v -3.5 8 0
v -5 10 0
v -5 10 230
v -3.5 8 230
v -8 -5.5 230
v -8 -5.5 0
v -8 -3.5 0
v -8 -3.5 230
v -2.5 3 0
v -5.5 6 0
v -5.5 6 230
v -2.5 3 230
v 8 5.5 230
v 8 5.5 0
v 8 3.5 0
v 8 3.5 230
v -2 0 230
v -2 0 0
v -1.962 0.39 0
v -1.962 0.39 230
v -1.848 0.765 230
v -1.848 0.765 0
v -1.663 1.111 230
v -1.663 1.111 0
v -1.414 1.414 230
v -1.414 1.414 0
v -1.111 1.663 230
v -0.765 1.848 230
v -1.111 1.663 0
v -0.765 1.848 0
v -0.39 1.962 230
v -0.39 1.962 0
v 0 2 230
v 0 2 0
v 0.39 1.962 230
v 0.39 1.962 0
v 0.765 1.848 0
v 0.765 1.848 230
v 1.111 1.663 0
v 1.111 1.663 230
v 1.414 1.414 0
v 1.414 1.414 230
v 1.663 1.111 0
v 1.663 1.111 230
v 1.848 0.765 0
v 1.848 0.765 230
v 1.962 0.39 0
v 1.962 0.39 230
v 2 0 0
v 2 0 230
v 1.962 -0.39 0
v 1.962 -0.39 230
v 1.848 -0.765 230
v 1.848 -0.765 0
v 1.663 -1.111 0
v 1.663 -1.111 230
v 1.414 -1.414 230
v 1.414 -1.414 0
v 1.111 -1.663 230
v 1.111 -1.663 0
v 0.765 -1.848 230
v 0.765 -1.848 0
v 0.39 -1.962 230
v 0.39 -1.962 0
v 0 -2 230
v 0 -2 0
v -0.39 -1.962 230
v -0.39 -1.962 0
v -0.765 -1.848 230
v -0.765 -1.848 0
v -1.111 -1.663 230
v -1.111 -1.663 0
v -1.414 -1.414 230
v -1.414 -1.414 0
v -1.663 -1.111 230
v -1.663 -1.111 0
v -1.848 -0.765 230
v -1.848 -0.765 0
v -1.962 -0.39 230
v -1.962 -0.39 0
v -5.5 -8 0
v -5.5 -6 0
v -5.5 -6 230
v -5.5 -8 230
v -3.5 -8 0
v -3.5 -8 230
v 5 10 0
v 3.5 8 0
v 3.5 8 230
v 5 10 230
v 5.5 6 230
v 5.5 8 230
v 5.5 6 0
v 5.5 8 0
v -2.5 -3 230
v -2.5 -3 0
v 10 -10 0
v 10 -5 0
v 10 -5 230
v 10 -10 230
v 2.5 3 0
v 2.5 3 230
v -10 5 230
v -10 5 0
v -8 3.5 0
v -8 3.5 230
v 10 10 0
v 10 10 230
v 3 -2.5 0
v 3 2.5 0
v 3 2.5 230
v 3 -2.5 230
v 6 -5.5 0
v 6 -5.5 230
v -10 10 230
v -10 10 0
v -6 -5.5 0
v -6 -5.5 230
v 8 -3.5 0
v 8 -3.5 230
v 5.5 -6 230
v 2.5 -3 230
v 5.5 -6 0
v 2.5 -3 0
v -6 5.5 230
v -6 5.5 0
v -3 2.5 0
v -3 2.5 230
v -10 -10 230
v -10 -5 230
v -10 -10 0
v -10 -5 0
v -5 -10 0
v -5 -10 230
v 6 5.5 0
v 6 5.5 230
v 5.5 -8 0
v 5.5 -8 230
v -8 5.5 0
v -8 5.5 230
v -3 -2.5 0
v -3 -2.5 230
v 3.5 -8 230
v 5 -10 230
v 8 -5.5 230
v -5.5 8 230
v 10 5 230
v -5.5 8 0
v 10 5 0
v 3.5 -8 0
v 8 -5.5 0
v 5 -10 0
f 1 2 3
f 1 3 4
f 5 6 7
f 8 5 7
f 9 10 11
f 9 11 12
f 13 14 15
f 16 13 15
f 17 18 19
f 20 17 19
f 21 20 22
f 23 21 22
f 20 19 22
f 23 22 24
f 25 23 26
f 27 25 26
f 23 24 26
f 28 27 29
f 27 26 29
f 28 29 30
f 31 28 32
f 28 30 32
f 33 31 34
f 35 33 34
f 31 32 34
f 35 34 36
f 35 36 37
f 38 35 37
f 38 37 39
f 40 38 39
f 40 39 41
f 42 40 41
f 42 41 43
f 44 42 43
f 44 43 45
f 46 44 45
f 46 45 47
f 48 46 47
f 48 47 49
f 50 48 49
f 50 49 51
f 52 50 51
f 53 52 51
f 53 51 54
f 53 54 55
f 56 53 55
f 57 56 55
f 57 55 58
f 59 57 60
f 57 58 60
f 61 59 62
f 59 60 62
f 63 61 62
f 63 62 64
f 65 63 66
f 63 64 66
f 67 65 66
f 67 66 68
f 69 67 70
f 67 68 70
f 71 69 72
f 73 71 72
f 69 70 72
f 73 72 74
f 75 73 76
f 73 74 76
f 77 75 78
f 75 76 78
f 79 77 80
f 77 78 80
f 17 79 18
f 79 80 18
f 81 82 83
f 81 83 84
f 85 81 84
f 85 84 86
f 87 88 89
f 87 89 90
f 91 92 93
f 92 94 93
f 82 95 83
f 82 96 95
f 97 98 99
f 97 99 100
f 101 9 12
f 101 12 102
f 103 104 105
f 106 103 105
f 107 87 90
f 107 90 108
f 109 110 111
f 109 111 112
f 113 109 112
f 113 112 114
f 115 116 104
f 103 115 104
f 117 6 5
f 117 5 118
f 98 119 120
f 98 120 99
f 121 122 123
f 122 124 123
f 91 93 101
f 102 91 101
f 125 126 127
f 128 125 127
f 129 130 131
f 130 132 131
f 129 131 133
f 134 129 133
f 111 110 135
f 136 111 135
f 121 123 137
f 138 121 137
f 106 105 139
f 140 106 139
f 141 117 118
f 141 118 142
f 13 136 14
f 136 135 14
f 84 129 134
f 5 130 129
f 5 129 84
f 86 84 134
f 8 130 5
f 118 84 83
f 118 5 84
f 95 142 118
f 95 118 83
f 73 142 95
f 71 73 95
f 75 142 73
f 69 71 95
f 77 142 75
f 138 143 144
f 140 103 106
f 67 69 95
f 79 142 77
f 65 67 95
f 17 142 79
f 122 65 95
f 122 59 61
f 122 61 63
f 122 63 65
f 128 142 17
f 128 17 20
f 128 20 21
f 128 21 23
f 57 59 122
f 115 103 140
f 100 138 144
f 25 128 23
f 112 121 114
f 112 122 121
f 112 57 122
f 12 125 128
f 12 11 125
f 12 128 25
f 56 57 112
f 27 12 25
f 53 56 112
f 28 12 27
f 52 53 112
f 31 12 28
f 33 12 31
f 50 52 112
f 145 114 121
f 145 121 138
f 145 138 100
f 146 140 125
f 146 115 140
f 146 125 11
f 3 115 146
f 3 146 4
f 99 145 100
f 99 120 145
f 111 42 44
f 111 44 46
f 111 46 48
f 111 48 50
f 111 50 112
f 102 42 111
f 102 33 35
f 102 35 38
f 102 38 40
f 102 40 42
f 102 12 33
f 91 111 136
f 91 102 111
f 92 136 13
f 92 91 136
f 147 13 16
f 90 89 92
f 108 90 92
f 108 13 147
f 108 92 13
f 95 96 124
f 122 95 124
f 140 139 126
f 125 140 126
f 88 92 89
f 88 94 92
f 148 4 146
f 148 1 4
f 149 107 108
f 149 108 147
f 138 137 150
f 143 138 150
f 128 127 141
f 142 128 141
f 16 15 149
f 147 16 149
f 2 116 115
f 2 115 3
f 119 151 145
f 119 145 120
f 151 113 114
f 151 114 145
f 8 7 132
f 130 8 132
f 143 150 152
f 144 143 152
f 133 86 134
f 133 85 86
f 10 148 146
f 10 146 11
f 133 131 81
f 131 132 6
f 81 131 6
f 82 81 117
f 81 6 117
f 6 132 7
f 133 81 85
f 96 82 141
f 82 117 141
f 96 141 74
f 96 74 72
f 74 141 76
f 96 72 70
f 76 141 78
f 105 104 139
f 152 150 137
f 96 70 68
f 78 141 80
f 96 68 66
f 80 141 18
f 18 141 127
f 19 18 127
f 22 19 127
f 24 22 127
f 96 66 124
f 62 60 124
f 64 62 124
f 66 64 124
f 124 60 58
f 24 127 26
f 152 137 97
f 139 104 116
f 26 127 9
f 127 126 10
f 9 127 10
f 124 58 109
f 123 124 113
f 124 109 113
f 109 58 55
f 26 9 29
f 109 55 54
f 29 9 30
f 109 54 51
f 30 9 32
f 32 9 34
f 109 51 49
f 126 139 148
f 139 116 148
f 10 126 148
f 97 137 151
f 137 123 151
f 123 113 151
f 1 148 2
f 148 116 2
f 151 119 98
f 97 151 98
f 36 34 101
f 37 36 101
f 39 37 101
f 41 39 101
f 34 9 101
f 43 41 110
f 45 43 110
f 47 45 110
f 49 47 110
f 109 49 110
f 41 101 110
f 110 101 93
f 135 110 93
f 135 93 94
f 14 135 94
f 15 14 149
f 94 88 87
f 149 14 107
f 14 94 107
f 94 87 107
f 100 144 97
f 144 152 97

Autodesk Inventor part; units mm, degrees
ref_plane "YZ Plane" through (0, 0, 0) normal (1, 0, 0) x (0, 1, 0)
ref_plane "XZ Plane" through (0, 0, 0) normal (0, 1, 0) x (-1, 0, 0)
ref_plane "XY Plane" through (0, 0, 0) normal (0, 0, 1) x (1, 0, 0)
sketch "Sketch1" plane through (0, 0, 0) normal (0, 0, 1) x (1, 0, 0)
  line L0 (-5, 10) -> (-3.5, 8)
  line L1 (-3.5, 8) -> (-5.5, 8)
  line L2 (5.5, 8) -> (3.5, 8)
  line L3 (3.5, 8) -> (5, 10)
  line L4 (-5.5, 8) -> (-5.5, 6)
  line L5 (5.5, 8) -> (5.5, 6)
  line L6 (-5.5, 6) -> (-2.5, 3)
  line L7 (5.5, 6) -> (2.5, 3)
  line L8 (-2.5, 3) -> (2.5, 3)
  line L9 (-10, 10) -> (-5, 10)
  line L10 (5, 10) -> (10, 10)
  line L11 (3, 2.5) -> (3, -2.5)
  line L12 (3, -2.5) -> (6, -5.5)
  line L13 (6, -5.5) -> (8, -5.5)
  line L14 (8, -5.5) -> (8, -3.5)
  line L15 (8, -3.5) -> (10, -5)
  line L16 (3, 2.5) -> (6, 5.5)
  line L17 (6, 5.5) -> (8, 5.5)
  line L18 (8, 5.5) -> (8, 3.5)
  line L19 (8, 3.5) -> (10, 5)
  line L20 (10, 10) -> (10, 5)
  line L21 (10, -5) -> (10, -10)
  line L22 (-10, 5) -> (-8, 3.5)
  line L23 (-8, 3.5) -> (-8, 5.5)
  line L24 (-8, -5.5) -> (-8, -3.5)
  line L25 (-8, -3.5) -> (-10, -5)
  line L26 (-8, 5.5) -> (-6, 5.5)
  line L27 (-8, -5.5) -> (-6, -5.5)
  line L28 (-6, 5.5) -> (-3, 2.5)
  line L29 (-6, -5.5) -> (-3, -2.5)
  line L30 (-3, 2.5) -> (-3, -2.5)
  line L31 (-10, 10) -> (-10, 5)
  line L32 (-10, -5) -> (-10, -10)
  line L33 (-2.5, -3) -> (2.5, -3)
  line L34 (2.5, -3) -> (5.5, -6)
  line L35 (5.5, -6) -> (5.5, -8)
  line L36 (5.5, -8) -> (3.5, -8)
  line L37 (3.5, -8) -> (5, -10)
  line L38 (-2.5, -3) -> (-5.5, -6)
  line L39 (-5.5, -6) -> (-5.5, -8)
  line L40 (-5.5, -8) -> (-3.5, -8)
  line L41 (-3.5, -8) -> (-5, -10)
  line L42 (-10, -10) -> (-5, -10)
  line L43 (5, -10) -> (10, -10)
  point P0 (0, 0)
  point P1 (0, 0)
  point P2 (0, 0)
  dimension "d0" = 20
  dimension "d1" = 20
  dimension "d3" = 2
  dimension "d4" = 2
  dimension "d6" = 1.5
  dimension "d7" = 2
  dimension "d8" = 2
  dimension "d9" = 3
  dimension "d11" = 3
  dimension "d12" = 3
  dimension "d13" = 5
  dimension "d22" = 5
  dimension "d24" = 3
  dimension "d25" = 3
  dimension "d26" = 2
  dimension "d27" = 5
  dimension "d28" = 2
  dimension "d29" = 2
  dimension "d30" = 1.5
  dimension "d31" = 3
  dimension "d32" = 5
  dimension "d33" = 5
  dimension "d35" = 5
  dimension "d36" = 5
  dimension "d37" = 5
  dimension "d38" = 5
  dimension "d40" = 3
  dimension "d41" = 3
  dimension "d42" = 2
  dimension "d43" = 2
  dimension "d48" = 3
  dimension "d49" = 3
  dimension "d50" = 3
  dimension "d51" = 3
  dimension "d52" = 0.5
  dimension "d53" = 0.5
  dimension "d54" = 0.5
  dimension "d55" = 0.5
  dimension "d56" = 0.5
extrude "Extrusion3" add sketch "Sketch1" along normal blind 230
sketch "Sketch3" plane through (0, 0, 0) normal (0, 0, -1) x (-1, 0, 0)
  circle A0 centre (0, 0) radius 2
  dimension "d59" = 4
extrude "Extrusion4" cut sketch "Sketch3" against normal through all
properties part number "20x20x100 Aluminium VSlot Extrustion"
